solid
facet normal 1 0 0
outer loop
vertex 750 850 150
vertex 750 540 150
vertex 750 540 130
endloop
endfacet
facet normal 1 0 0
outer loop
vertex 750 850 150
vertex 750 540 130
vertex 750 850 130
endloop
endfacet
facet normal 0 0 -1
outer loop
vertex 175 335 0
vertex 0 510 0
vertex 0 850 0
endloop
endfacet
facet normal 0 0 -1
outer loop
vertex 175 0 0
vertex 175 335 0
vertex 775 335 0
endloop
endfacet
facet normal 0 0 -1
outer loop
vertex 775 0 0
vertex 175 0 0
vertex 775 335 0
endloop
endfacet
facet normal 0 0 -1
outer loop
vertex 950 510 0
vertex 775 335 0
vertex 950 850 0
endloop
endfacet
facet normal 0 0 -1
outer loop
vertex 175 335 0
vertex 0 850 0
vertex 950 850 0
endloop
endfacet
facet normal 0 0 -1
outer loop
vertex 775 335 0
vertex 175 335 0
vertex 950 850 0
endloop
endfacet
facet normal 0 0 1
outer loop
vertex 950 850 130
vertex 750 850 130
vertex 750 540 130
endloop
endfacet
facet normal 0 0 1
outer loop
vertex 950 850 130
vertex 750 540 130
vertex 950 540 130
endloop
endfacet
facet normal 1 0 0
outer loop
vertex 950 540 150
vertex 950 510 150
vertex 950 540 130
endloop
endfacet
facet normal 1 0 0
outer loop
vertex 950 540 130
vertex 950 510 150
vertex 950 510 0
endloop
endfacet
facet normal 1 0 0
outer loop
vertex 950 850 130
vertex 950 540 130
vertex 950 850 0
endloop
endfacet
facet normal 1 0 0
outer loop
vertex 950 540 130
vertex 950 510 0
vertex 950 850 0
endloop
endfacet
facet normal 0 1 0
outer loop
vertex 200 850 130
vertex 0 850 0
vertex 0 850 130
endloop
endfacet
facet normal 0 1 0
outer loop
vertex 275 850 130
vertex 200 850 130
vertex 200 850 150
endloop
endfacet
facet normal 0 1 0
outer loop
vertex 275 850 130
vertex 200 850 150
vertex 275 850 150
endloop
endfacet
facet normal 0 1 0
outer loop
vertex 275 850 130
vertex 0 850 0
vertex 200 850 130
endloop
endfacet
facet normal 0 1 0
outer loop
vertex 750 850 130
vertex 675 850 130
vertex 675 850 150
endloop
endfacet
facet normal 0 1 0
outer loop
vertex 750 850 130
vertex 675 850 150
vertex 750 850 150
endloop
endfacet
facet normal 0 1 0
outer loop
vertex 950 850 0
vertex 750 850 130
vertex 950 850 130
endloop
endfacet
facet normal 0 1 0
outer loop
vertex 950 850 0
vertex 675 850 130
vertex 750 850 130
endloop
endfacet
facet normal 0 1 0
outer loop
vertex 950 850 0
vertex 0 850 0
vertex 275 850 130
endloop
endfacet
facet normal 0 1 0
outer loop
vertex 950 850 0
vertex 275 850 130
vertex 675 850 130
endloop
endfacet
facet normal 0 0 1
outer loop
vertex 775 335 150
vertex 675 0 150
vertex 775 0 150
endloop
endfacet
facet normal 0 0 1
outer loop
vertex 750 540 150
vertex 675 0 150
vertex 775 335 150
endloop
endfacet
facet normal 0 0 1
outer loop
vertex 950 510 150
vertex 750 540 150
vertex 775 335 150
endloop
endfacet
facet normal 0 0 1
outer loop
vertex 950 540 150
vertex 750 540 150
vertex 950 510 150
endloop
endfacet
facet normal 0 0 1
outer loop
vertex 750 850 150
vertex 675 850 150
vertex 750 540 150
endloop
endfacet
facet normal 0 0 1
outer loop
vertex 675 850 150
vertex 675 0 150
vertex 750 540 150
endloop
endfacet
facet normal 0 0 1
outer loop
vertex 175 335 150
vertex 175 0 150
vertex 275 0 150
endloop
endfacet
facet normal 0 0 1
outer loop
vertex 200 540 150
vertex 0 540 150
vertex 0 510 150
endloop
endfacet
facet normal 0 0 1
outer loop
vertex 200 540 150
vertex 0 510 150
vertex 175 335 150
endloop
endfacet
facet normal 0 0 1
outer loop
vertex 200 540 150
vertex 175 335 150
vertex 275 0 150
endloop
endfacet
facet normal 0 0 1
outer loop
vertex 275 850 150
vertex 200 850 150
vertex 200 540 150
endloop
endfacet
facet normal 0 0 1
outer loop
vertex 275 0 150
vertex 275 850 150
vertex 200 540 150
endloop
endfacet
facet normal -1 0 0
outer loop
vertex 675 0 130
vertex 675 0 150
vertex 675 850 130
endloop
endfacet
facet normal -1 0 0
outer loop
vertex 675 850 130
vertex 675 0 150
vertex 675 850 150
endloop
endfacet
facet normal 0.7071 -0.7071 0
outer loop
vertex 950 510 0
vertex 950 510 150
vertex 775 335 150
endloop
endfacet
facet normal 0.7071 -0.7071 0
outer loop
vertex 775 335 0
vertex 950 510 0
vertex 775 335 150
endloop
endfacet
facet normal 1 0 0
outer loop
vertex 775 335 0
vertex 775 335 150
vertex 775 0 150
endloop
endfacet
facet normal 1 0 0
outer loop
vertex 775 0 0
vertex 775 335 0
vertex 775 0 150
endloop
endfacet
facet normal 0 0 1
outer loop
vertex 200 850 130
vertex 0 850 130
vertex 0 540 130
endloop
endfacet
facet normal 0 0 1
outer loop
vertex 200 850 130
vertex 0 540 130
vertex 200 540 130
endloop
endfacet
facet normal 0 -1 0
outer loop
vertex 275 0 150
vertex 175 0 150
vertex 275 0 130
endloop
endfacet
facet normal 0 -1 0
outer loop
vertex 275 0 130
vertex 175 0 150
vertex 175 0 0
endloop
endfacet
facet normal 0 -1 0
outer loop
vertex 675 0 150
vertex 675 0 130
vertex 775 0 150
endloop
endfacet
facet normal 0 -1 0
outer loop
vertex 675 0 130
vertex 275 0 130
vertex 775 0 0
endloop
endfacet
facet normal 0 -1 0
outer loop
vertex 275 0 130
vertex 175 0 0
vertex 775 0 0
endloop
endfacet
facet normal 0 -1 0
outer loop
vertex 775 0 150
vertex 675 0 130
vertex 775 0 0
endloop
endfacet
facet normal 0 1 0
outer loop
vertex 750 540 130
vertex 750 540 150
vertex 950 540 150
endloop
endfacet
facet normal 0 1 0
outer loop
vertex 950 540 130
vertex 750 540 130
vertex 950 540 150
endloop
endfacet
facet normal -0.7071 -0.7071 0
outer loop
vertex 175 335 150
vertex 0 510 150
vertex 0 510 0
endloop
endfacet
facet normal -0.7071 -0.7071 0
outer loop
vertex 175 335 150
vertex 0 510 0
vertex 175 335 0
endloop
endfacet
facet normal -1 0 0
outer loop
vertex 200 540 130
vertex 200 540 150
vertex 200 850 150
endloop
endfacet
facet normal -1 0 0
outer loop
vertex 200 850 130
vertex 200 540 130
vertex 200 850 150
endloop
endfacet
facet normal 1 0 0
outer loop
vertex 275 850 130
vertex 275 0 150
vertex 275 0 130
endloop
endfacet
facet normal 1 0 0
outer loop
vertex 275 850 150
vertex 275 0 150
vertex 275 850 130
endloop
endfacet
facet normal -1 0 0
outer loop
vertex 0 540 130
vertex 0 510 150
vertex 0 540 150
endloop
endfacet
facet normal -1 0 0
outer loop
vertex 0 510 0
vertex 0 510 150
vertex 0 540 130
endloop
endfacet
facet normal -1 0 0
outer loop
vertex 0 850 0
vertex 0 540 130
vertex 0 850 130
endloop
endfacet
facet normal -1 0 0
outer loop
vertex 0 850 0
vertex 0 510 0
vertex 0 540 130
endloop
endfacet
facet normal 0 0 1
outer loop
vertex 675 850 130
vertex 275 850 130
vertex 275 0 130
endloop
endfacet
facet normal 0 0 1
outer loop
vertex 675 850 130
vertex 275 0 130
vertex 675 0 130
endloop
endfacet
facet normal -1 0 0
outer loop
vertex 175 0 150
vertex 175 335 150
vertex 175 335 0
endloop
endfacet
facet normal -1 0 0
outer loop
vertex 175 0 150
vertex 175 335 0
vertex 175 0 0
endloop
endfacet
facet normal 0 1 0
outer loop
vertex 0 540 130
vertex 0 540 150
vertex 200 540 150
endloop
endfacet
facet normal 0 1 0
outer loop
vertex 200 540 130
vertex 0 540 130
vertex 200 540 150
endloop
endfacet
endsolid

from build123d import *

# Parameters (mm, degrees)
SKETCH_W        = 950
SKETCH_H        = 850
PAD_DEPTH       = 150
SKETCH002_W     = 200
SKETCH002_H     = 310
POCKET_DEPTH    = 20
SKETCH003_W     = 400
SKETCH003_H     = 850
POCKET001_DEPTH = 20
POCKET002_DEPTH = 150.001


with BuildPart() as part:
    # Sketch → Pad (new body)
    with BuildSketch(Plane.XY):
        with Locations((475, 425)):
            Rectangle(SKETCH_W, SKETCH_H)
    extrude(amount=PAD_DEPTH)

    # Sketch002 (on Face6 of Pad) → Pocket (cut)
    with BuildSketch(Plane.XY.offset(150)):
        with Locations((100, 695)):
            Rectangle(SKETCH002_W, SKETCH002_H)
        with Locations((850, 695)):
            Rectangle(SKETCH002_W, SKETCH002_H)
    extrude(amount=-POCKET_DEPTH, mode=Mode.SUBTRACT)

    # Sketch003 (on Face5 of Pocket) → Pocket001 (cut)
    with BuildSketch(Plane.XY.offset(150)):
        with Locations((475, 425)):
            Rectangle(SKETCH003_W, SKETCH003_H)
    extrude(amount=-POCKET001_DEPTH, mode=Mode.SUBTRACT)

    # Sketch004 (on Face4 of Pocket001) → Pocket002 (cut, through all)
    with BuildSketch(Plane.XY.offset(150)):
        Polygon((0, 510), (175, 335), (175, 0), (0, 0), align=None)
        Polygon((950, 510), (775, 335), (775, 0), (950, 0), align=None)
    extrude(amount=-POCKET002_DEPTH, mode=Mode.SUBTRACT)


solid = part.part
